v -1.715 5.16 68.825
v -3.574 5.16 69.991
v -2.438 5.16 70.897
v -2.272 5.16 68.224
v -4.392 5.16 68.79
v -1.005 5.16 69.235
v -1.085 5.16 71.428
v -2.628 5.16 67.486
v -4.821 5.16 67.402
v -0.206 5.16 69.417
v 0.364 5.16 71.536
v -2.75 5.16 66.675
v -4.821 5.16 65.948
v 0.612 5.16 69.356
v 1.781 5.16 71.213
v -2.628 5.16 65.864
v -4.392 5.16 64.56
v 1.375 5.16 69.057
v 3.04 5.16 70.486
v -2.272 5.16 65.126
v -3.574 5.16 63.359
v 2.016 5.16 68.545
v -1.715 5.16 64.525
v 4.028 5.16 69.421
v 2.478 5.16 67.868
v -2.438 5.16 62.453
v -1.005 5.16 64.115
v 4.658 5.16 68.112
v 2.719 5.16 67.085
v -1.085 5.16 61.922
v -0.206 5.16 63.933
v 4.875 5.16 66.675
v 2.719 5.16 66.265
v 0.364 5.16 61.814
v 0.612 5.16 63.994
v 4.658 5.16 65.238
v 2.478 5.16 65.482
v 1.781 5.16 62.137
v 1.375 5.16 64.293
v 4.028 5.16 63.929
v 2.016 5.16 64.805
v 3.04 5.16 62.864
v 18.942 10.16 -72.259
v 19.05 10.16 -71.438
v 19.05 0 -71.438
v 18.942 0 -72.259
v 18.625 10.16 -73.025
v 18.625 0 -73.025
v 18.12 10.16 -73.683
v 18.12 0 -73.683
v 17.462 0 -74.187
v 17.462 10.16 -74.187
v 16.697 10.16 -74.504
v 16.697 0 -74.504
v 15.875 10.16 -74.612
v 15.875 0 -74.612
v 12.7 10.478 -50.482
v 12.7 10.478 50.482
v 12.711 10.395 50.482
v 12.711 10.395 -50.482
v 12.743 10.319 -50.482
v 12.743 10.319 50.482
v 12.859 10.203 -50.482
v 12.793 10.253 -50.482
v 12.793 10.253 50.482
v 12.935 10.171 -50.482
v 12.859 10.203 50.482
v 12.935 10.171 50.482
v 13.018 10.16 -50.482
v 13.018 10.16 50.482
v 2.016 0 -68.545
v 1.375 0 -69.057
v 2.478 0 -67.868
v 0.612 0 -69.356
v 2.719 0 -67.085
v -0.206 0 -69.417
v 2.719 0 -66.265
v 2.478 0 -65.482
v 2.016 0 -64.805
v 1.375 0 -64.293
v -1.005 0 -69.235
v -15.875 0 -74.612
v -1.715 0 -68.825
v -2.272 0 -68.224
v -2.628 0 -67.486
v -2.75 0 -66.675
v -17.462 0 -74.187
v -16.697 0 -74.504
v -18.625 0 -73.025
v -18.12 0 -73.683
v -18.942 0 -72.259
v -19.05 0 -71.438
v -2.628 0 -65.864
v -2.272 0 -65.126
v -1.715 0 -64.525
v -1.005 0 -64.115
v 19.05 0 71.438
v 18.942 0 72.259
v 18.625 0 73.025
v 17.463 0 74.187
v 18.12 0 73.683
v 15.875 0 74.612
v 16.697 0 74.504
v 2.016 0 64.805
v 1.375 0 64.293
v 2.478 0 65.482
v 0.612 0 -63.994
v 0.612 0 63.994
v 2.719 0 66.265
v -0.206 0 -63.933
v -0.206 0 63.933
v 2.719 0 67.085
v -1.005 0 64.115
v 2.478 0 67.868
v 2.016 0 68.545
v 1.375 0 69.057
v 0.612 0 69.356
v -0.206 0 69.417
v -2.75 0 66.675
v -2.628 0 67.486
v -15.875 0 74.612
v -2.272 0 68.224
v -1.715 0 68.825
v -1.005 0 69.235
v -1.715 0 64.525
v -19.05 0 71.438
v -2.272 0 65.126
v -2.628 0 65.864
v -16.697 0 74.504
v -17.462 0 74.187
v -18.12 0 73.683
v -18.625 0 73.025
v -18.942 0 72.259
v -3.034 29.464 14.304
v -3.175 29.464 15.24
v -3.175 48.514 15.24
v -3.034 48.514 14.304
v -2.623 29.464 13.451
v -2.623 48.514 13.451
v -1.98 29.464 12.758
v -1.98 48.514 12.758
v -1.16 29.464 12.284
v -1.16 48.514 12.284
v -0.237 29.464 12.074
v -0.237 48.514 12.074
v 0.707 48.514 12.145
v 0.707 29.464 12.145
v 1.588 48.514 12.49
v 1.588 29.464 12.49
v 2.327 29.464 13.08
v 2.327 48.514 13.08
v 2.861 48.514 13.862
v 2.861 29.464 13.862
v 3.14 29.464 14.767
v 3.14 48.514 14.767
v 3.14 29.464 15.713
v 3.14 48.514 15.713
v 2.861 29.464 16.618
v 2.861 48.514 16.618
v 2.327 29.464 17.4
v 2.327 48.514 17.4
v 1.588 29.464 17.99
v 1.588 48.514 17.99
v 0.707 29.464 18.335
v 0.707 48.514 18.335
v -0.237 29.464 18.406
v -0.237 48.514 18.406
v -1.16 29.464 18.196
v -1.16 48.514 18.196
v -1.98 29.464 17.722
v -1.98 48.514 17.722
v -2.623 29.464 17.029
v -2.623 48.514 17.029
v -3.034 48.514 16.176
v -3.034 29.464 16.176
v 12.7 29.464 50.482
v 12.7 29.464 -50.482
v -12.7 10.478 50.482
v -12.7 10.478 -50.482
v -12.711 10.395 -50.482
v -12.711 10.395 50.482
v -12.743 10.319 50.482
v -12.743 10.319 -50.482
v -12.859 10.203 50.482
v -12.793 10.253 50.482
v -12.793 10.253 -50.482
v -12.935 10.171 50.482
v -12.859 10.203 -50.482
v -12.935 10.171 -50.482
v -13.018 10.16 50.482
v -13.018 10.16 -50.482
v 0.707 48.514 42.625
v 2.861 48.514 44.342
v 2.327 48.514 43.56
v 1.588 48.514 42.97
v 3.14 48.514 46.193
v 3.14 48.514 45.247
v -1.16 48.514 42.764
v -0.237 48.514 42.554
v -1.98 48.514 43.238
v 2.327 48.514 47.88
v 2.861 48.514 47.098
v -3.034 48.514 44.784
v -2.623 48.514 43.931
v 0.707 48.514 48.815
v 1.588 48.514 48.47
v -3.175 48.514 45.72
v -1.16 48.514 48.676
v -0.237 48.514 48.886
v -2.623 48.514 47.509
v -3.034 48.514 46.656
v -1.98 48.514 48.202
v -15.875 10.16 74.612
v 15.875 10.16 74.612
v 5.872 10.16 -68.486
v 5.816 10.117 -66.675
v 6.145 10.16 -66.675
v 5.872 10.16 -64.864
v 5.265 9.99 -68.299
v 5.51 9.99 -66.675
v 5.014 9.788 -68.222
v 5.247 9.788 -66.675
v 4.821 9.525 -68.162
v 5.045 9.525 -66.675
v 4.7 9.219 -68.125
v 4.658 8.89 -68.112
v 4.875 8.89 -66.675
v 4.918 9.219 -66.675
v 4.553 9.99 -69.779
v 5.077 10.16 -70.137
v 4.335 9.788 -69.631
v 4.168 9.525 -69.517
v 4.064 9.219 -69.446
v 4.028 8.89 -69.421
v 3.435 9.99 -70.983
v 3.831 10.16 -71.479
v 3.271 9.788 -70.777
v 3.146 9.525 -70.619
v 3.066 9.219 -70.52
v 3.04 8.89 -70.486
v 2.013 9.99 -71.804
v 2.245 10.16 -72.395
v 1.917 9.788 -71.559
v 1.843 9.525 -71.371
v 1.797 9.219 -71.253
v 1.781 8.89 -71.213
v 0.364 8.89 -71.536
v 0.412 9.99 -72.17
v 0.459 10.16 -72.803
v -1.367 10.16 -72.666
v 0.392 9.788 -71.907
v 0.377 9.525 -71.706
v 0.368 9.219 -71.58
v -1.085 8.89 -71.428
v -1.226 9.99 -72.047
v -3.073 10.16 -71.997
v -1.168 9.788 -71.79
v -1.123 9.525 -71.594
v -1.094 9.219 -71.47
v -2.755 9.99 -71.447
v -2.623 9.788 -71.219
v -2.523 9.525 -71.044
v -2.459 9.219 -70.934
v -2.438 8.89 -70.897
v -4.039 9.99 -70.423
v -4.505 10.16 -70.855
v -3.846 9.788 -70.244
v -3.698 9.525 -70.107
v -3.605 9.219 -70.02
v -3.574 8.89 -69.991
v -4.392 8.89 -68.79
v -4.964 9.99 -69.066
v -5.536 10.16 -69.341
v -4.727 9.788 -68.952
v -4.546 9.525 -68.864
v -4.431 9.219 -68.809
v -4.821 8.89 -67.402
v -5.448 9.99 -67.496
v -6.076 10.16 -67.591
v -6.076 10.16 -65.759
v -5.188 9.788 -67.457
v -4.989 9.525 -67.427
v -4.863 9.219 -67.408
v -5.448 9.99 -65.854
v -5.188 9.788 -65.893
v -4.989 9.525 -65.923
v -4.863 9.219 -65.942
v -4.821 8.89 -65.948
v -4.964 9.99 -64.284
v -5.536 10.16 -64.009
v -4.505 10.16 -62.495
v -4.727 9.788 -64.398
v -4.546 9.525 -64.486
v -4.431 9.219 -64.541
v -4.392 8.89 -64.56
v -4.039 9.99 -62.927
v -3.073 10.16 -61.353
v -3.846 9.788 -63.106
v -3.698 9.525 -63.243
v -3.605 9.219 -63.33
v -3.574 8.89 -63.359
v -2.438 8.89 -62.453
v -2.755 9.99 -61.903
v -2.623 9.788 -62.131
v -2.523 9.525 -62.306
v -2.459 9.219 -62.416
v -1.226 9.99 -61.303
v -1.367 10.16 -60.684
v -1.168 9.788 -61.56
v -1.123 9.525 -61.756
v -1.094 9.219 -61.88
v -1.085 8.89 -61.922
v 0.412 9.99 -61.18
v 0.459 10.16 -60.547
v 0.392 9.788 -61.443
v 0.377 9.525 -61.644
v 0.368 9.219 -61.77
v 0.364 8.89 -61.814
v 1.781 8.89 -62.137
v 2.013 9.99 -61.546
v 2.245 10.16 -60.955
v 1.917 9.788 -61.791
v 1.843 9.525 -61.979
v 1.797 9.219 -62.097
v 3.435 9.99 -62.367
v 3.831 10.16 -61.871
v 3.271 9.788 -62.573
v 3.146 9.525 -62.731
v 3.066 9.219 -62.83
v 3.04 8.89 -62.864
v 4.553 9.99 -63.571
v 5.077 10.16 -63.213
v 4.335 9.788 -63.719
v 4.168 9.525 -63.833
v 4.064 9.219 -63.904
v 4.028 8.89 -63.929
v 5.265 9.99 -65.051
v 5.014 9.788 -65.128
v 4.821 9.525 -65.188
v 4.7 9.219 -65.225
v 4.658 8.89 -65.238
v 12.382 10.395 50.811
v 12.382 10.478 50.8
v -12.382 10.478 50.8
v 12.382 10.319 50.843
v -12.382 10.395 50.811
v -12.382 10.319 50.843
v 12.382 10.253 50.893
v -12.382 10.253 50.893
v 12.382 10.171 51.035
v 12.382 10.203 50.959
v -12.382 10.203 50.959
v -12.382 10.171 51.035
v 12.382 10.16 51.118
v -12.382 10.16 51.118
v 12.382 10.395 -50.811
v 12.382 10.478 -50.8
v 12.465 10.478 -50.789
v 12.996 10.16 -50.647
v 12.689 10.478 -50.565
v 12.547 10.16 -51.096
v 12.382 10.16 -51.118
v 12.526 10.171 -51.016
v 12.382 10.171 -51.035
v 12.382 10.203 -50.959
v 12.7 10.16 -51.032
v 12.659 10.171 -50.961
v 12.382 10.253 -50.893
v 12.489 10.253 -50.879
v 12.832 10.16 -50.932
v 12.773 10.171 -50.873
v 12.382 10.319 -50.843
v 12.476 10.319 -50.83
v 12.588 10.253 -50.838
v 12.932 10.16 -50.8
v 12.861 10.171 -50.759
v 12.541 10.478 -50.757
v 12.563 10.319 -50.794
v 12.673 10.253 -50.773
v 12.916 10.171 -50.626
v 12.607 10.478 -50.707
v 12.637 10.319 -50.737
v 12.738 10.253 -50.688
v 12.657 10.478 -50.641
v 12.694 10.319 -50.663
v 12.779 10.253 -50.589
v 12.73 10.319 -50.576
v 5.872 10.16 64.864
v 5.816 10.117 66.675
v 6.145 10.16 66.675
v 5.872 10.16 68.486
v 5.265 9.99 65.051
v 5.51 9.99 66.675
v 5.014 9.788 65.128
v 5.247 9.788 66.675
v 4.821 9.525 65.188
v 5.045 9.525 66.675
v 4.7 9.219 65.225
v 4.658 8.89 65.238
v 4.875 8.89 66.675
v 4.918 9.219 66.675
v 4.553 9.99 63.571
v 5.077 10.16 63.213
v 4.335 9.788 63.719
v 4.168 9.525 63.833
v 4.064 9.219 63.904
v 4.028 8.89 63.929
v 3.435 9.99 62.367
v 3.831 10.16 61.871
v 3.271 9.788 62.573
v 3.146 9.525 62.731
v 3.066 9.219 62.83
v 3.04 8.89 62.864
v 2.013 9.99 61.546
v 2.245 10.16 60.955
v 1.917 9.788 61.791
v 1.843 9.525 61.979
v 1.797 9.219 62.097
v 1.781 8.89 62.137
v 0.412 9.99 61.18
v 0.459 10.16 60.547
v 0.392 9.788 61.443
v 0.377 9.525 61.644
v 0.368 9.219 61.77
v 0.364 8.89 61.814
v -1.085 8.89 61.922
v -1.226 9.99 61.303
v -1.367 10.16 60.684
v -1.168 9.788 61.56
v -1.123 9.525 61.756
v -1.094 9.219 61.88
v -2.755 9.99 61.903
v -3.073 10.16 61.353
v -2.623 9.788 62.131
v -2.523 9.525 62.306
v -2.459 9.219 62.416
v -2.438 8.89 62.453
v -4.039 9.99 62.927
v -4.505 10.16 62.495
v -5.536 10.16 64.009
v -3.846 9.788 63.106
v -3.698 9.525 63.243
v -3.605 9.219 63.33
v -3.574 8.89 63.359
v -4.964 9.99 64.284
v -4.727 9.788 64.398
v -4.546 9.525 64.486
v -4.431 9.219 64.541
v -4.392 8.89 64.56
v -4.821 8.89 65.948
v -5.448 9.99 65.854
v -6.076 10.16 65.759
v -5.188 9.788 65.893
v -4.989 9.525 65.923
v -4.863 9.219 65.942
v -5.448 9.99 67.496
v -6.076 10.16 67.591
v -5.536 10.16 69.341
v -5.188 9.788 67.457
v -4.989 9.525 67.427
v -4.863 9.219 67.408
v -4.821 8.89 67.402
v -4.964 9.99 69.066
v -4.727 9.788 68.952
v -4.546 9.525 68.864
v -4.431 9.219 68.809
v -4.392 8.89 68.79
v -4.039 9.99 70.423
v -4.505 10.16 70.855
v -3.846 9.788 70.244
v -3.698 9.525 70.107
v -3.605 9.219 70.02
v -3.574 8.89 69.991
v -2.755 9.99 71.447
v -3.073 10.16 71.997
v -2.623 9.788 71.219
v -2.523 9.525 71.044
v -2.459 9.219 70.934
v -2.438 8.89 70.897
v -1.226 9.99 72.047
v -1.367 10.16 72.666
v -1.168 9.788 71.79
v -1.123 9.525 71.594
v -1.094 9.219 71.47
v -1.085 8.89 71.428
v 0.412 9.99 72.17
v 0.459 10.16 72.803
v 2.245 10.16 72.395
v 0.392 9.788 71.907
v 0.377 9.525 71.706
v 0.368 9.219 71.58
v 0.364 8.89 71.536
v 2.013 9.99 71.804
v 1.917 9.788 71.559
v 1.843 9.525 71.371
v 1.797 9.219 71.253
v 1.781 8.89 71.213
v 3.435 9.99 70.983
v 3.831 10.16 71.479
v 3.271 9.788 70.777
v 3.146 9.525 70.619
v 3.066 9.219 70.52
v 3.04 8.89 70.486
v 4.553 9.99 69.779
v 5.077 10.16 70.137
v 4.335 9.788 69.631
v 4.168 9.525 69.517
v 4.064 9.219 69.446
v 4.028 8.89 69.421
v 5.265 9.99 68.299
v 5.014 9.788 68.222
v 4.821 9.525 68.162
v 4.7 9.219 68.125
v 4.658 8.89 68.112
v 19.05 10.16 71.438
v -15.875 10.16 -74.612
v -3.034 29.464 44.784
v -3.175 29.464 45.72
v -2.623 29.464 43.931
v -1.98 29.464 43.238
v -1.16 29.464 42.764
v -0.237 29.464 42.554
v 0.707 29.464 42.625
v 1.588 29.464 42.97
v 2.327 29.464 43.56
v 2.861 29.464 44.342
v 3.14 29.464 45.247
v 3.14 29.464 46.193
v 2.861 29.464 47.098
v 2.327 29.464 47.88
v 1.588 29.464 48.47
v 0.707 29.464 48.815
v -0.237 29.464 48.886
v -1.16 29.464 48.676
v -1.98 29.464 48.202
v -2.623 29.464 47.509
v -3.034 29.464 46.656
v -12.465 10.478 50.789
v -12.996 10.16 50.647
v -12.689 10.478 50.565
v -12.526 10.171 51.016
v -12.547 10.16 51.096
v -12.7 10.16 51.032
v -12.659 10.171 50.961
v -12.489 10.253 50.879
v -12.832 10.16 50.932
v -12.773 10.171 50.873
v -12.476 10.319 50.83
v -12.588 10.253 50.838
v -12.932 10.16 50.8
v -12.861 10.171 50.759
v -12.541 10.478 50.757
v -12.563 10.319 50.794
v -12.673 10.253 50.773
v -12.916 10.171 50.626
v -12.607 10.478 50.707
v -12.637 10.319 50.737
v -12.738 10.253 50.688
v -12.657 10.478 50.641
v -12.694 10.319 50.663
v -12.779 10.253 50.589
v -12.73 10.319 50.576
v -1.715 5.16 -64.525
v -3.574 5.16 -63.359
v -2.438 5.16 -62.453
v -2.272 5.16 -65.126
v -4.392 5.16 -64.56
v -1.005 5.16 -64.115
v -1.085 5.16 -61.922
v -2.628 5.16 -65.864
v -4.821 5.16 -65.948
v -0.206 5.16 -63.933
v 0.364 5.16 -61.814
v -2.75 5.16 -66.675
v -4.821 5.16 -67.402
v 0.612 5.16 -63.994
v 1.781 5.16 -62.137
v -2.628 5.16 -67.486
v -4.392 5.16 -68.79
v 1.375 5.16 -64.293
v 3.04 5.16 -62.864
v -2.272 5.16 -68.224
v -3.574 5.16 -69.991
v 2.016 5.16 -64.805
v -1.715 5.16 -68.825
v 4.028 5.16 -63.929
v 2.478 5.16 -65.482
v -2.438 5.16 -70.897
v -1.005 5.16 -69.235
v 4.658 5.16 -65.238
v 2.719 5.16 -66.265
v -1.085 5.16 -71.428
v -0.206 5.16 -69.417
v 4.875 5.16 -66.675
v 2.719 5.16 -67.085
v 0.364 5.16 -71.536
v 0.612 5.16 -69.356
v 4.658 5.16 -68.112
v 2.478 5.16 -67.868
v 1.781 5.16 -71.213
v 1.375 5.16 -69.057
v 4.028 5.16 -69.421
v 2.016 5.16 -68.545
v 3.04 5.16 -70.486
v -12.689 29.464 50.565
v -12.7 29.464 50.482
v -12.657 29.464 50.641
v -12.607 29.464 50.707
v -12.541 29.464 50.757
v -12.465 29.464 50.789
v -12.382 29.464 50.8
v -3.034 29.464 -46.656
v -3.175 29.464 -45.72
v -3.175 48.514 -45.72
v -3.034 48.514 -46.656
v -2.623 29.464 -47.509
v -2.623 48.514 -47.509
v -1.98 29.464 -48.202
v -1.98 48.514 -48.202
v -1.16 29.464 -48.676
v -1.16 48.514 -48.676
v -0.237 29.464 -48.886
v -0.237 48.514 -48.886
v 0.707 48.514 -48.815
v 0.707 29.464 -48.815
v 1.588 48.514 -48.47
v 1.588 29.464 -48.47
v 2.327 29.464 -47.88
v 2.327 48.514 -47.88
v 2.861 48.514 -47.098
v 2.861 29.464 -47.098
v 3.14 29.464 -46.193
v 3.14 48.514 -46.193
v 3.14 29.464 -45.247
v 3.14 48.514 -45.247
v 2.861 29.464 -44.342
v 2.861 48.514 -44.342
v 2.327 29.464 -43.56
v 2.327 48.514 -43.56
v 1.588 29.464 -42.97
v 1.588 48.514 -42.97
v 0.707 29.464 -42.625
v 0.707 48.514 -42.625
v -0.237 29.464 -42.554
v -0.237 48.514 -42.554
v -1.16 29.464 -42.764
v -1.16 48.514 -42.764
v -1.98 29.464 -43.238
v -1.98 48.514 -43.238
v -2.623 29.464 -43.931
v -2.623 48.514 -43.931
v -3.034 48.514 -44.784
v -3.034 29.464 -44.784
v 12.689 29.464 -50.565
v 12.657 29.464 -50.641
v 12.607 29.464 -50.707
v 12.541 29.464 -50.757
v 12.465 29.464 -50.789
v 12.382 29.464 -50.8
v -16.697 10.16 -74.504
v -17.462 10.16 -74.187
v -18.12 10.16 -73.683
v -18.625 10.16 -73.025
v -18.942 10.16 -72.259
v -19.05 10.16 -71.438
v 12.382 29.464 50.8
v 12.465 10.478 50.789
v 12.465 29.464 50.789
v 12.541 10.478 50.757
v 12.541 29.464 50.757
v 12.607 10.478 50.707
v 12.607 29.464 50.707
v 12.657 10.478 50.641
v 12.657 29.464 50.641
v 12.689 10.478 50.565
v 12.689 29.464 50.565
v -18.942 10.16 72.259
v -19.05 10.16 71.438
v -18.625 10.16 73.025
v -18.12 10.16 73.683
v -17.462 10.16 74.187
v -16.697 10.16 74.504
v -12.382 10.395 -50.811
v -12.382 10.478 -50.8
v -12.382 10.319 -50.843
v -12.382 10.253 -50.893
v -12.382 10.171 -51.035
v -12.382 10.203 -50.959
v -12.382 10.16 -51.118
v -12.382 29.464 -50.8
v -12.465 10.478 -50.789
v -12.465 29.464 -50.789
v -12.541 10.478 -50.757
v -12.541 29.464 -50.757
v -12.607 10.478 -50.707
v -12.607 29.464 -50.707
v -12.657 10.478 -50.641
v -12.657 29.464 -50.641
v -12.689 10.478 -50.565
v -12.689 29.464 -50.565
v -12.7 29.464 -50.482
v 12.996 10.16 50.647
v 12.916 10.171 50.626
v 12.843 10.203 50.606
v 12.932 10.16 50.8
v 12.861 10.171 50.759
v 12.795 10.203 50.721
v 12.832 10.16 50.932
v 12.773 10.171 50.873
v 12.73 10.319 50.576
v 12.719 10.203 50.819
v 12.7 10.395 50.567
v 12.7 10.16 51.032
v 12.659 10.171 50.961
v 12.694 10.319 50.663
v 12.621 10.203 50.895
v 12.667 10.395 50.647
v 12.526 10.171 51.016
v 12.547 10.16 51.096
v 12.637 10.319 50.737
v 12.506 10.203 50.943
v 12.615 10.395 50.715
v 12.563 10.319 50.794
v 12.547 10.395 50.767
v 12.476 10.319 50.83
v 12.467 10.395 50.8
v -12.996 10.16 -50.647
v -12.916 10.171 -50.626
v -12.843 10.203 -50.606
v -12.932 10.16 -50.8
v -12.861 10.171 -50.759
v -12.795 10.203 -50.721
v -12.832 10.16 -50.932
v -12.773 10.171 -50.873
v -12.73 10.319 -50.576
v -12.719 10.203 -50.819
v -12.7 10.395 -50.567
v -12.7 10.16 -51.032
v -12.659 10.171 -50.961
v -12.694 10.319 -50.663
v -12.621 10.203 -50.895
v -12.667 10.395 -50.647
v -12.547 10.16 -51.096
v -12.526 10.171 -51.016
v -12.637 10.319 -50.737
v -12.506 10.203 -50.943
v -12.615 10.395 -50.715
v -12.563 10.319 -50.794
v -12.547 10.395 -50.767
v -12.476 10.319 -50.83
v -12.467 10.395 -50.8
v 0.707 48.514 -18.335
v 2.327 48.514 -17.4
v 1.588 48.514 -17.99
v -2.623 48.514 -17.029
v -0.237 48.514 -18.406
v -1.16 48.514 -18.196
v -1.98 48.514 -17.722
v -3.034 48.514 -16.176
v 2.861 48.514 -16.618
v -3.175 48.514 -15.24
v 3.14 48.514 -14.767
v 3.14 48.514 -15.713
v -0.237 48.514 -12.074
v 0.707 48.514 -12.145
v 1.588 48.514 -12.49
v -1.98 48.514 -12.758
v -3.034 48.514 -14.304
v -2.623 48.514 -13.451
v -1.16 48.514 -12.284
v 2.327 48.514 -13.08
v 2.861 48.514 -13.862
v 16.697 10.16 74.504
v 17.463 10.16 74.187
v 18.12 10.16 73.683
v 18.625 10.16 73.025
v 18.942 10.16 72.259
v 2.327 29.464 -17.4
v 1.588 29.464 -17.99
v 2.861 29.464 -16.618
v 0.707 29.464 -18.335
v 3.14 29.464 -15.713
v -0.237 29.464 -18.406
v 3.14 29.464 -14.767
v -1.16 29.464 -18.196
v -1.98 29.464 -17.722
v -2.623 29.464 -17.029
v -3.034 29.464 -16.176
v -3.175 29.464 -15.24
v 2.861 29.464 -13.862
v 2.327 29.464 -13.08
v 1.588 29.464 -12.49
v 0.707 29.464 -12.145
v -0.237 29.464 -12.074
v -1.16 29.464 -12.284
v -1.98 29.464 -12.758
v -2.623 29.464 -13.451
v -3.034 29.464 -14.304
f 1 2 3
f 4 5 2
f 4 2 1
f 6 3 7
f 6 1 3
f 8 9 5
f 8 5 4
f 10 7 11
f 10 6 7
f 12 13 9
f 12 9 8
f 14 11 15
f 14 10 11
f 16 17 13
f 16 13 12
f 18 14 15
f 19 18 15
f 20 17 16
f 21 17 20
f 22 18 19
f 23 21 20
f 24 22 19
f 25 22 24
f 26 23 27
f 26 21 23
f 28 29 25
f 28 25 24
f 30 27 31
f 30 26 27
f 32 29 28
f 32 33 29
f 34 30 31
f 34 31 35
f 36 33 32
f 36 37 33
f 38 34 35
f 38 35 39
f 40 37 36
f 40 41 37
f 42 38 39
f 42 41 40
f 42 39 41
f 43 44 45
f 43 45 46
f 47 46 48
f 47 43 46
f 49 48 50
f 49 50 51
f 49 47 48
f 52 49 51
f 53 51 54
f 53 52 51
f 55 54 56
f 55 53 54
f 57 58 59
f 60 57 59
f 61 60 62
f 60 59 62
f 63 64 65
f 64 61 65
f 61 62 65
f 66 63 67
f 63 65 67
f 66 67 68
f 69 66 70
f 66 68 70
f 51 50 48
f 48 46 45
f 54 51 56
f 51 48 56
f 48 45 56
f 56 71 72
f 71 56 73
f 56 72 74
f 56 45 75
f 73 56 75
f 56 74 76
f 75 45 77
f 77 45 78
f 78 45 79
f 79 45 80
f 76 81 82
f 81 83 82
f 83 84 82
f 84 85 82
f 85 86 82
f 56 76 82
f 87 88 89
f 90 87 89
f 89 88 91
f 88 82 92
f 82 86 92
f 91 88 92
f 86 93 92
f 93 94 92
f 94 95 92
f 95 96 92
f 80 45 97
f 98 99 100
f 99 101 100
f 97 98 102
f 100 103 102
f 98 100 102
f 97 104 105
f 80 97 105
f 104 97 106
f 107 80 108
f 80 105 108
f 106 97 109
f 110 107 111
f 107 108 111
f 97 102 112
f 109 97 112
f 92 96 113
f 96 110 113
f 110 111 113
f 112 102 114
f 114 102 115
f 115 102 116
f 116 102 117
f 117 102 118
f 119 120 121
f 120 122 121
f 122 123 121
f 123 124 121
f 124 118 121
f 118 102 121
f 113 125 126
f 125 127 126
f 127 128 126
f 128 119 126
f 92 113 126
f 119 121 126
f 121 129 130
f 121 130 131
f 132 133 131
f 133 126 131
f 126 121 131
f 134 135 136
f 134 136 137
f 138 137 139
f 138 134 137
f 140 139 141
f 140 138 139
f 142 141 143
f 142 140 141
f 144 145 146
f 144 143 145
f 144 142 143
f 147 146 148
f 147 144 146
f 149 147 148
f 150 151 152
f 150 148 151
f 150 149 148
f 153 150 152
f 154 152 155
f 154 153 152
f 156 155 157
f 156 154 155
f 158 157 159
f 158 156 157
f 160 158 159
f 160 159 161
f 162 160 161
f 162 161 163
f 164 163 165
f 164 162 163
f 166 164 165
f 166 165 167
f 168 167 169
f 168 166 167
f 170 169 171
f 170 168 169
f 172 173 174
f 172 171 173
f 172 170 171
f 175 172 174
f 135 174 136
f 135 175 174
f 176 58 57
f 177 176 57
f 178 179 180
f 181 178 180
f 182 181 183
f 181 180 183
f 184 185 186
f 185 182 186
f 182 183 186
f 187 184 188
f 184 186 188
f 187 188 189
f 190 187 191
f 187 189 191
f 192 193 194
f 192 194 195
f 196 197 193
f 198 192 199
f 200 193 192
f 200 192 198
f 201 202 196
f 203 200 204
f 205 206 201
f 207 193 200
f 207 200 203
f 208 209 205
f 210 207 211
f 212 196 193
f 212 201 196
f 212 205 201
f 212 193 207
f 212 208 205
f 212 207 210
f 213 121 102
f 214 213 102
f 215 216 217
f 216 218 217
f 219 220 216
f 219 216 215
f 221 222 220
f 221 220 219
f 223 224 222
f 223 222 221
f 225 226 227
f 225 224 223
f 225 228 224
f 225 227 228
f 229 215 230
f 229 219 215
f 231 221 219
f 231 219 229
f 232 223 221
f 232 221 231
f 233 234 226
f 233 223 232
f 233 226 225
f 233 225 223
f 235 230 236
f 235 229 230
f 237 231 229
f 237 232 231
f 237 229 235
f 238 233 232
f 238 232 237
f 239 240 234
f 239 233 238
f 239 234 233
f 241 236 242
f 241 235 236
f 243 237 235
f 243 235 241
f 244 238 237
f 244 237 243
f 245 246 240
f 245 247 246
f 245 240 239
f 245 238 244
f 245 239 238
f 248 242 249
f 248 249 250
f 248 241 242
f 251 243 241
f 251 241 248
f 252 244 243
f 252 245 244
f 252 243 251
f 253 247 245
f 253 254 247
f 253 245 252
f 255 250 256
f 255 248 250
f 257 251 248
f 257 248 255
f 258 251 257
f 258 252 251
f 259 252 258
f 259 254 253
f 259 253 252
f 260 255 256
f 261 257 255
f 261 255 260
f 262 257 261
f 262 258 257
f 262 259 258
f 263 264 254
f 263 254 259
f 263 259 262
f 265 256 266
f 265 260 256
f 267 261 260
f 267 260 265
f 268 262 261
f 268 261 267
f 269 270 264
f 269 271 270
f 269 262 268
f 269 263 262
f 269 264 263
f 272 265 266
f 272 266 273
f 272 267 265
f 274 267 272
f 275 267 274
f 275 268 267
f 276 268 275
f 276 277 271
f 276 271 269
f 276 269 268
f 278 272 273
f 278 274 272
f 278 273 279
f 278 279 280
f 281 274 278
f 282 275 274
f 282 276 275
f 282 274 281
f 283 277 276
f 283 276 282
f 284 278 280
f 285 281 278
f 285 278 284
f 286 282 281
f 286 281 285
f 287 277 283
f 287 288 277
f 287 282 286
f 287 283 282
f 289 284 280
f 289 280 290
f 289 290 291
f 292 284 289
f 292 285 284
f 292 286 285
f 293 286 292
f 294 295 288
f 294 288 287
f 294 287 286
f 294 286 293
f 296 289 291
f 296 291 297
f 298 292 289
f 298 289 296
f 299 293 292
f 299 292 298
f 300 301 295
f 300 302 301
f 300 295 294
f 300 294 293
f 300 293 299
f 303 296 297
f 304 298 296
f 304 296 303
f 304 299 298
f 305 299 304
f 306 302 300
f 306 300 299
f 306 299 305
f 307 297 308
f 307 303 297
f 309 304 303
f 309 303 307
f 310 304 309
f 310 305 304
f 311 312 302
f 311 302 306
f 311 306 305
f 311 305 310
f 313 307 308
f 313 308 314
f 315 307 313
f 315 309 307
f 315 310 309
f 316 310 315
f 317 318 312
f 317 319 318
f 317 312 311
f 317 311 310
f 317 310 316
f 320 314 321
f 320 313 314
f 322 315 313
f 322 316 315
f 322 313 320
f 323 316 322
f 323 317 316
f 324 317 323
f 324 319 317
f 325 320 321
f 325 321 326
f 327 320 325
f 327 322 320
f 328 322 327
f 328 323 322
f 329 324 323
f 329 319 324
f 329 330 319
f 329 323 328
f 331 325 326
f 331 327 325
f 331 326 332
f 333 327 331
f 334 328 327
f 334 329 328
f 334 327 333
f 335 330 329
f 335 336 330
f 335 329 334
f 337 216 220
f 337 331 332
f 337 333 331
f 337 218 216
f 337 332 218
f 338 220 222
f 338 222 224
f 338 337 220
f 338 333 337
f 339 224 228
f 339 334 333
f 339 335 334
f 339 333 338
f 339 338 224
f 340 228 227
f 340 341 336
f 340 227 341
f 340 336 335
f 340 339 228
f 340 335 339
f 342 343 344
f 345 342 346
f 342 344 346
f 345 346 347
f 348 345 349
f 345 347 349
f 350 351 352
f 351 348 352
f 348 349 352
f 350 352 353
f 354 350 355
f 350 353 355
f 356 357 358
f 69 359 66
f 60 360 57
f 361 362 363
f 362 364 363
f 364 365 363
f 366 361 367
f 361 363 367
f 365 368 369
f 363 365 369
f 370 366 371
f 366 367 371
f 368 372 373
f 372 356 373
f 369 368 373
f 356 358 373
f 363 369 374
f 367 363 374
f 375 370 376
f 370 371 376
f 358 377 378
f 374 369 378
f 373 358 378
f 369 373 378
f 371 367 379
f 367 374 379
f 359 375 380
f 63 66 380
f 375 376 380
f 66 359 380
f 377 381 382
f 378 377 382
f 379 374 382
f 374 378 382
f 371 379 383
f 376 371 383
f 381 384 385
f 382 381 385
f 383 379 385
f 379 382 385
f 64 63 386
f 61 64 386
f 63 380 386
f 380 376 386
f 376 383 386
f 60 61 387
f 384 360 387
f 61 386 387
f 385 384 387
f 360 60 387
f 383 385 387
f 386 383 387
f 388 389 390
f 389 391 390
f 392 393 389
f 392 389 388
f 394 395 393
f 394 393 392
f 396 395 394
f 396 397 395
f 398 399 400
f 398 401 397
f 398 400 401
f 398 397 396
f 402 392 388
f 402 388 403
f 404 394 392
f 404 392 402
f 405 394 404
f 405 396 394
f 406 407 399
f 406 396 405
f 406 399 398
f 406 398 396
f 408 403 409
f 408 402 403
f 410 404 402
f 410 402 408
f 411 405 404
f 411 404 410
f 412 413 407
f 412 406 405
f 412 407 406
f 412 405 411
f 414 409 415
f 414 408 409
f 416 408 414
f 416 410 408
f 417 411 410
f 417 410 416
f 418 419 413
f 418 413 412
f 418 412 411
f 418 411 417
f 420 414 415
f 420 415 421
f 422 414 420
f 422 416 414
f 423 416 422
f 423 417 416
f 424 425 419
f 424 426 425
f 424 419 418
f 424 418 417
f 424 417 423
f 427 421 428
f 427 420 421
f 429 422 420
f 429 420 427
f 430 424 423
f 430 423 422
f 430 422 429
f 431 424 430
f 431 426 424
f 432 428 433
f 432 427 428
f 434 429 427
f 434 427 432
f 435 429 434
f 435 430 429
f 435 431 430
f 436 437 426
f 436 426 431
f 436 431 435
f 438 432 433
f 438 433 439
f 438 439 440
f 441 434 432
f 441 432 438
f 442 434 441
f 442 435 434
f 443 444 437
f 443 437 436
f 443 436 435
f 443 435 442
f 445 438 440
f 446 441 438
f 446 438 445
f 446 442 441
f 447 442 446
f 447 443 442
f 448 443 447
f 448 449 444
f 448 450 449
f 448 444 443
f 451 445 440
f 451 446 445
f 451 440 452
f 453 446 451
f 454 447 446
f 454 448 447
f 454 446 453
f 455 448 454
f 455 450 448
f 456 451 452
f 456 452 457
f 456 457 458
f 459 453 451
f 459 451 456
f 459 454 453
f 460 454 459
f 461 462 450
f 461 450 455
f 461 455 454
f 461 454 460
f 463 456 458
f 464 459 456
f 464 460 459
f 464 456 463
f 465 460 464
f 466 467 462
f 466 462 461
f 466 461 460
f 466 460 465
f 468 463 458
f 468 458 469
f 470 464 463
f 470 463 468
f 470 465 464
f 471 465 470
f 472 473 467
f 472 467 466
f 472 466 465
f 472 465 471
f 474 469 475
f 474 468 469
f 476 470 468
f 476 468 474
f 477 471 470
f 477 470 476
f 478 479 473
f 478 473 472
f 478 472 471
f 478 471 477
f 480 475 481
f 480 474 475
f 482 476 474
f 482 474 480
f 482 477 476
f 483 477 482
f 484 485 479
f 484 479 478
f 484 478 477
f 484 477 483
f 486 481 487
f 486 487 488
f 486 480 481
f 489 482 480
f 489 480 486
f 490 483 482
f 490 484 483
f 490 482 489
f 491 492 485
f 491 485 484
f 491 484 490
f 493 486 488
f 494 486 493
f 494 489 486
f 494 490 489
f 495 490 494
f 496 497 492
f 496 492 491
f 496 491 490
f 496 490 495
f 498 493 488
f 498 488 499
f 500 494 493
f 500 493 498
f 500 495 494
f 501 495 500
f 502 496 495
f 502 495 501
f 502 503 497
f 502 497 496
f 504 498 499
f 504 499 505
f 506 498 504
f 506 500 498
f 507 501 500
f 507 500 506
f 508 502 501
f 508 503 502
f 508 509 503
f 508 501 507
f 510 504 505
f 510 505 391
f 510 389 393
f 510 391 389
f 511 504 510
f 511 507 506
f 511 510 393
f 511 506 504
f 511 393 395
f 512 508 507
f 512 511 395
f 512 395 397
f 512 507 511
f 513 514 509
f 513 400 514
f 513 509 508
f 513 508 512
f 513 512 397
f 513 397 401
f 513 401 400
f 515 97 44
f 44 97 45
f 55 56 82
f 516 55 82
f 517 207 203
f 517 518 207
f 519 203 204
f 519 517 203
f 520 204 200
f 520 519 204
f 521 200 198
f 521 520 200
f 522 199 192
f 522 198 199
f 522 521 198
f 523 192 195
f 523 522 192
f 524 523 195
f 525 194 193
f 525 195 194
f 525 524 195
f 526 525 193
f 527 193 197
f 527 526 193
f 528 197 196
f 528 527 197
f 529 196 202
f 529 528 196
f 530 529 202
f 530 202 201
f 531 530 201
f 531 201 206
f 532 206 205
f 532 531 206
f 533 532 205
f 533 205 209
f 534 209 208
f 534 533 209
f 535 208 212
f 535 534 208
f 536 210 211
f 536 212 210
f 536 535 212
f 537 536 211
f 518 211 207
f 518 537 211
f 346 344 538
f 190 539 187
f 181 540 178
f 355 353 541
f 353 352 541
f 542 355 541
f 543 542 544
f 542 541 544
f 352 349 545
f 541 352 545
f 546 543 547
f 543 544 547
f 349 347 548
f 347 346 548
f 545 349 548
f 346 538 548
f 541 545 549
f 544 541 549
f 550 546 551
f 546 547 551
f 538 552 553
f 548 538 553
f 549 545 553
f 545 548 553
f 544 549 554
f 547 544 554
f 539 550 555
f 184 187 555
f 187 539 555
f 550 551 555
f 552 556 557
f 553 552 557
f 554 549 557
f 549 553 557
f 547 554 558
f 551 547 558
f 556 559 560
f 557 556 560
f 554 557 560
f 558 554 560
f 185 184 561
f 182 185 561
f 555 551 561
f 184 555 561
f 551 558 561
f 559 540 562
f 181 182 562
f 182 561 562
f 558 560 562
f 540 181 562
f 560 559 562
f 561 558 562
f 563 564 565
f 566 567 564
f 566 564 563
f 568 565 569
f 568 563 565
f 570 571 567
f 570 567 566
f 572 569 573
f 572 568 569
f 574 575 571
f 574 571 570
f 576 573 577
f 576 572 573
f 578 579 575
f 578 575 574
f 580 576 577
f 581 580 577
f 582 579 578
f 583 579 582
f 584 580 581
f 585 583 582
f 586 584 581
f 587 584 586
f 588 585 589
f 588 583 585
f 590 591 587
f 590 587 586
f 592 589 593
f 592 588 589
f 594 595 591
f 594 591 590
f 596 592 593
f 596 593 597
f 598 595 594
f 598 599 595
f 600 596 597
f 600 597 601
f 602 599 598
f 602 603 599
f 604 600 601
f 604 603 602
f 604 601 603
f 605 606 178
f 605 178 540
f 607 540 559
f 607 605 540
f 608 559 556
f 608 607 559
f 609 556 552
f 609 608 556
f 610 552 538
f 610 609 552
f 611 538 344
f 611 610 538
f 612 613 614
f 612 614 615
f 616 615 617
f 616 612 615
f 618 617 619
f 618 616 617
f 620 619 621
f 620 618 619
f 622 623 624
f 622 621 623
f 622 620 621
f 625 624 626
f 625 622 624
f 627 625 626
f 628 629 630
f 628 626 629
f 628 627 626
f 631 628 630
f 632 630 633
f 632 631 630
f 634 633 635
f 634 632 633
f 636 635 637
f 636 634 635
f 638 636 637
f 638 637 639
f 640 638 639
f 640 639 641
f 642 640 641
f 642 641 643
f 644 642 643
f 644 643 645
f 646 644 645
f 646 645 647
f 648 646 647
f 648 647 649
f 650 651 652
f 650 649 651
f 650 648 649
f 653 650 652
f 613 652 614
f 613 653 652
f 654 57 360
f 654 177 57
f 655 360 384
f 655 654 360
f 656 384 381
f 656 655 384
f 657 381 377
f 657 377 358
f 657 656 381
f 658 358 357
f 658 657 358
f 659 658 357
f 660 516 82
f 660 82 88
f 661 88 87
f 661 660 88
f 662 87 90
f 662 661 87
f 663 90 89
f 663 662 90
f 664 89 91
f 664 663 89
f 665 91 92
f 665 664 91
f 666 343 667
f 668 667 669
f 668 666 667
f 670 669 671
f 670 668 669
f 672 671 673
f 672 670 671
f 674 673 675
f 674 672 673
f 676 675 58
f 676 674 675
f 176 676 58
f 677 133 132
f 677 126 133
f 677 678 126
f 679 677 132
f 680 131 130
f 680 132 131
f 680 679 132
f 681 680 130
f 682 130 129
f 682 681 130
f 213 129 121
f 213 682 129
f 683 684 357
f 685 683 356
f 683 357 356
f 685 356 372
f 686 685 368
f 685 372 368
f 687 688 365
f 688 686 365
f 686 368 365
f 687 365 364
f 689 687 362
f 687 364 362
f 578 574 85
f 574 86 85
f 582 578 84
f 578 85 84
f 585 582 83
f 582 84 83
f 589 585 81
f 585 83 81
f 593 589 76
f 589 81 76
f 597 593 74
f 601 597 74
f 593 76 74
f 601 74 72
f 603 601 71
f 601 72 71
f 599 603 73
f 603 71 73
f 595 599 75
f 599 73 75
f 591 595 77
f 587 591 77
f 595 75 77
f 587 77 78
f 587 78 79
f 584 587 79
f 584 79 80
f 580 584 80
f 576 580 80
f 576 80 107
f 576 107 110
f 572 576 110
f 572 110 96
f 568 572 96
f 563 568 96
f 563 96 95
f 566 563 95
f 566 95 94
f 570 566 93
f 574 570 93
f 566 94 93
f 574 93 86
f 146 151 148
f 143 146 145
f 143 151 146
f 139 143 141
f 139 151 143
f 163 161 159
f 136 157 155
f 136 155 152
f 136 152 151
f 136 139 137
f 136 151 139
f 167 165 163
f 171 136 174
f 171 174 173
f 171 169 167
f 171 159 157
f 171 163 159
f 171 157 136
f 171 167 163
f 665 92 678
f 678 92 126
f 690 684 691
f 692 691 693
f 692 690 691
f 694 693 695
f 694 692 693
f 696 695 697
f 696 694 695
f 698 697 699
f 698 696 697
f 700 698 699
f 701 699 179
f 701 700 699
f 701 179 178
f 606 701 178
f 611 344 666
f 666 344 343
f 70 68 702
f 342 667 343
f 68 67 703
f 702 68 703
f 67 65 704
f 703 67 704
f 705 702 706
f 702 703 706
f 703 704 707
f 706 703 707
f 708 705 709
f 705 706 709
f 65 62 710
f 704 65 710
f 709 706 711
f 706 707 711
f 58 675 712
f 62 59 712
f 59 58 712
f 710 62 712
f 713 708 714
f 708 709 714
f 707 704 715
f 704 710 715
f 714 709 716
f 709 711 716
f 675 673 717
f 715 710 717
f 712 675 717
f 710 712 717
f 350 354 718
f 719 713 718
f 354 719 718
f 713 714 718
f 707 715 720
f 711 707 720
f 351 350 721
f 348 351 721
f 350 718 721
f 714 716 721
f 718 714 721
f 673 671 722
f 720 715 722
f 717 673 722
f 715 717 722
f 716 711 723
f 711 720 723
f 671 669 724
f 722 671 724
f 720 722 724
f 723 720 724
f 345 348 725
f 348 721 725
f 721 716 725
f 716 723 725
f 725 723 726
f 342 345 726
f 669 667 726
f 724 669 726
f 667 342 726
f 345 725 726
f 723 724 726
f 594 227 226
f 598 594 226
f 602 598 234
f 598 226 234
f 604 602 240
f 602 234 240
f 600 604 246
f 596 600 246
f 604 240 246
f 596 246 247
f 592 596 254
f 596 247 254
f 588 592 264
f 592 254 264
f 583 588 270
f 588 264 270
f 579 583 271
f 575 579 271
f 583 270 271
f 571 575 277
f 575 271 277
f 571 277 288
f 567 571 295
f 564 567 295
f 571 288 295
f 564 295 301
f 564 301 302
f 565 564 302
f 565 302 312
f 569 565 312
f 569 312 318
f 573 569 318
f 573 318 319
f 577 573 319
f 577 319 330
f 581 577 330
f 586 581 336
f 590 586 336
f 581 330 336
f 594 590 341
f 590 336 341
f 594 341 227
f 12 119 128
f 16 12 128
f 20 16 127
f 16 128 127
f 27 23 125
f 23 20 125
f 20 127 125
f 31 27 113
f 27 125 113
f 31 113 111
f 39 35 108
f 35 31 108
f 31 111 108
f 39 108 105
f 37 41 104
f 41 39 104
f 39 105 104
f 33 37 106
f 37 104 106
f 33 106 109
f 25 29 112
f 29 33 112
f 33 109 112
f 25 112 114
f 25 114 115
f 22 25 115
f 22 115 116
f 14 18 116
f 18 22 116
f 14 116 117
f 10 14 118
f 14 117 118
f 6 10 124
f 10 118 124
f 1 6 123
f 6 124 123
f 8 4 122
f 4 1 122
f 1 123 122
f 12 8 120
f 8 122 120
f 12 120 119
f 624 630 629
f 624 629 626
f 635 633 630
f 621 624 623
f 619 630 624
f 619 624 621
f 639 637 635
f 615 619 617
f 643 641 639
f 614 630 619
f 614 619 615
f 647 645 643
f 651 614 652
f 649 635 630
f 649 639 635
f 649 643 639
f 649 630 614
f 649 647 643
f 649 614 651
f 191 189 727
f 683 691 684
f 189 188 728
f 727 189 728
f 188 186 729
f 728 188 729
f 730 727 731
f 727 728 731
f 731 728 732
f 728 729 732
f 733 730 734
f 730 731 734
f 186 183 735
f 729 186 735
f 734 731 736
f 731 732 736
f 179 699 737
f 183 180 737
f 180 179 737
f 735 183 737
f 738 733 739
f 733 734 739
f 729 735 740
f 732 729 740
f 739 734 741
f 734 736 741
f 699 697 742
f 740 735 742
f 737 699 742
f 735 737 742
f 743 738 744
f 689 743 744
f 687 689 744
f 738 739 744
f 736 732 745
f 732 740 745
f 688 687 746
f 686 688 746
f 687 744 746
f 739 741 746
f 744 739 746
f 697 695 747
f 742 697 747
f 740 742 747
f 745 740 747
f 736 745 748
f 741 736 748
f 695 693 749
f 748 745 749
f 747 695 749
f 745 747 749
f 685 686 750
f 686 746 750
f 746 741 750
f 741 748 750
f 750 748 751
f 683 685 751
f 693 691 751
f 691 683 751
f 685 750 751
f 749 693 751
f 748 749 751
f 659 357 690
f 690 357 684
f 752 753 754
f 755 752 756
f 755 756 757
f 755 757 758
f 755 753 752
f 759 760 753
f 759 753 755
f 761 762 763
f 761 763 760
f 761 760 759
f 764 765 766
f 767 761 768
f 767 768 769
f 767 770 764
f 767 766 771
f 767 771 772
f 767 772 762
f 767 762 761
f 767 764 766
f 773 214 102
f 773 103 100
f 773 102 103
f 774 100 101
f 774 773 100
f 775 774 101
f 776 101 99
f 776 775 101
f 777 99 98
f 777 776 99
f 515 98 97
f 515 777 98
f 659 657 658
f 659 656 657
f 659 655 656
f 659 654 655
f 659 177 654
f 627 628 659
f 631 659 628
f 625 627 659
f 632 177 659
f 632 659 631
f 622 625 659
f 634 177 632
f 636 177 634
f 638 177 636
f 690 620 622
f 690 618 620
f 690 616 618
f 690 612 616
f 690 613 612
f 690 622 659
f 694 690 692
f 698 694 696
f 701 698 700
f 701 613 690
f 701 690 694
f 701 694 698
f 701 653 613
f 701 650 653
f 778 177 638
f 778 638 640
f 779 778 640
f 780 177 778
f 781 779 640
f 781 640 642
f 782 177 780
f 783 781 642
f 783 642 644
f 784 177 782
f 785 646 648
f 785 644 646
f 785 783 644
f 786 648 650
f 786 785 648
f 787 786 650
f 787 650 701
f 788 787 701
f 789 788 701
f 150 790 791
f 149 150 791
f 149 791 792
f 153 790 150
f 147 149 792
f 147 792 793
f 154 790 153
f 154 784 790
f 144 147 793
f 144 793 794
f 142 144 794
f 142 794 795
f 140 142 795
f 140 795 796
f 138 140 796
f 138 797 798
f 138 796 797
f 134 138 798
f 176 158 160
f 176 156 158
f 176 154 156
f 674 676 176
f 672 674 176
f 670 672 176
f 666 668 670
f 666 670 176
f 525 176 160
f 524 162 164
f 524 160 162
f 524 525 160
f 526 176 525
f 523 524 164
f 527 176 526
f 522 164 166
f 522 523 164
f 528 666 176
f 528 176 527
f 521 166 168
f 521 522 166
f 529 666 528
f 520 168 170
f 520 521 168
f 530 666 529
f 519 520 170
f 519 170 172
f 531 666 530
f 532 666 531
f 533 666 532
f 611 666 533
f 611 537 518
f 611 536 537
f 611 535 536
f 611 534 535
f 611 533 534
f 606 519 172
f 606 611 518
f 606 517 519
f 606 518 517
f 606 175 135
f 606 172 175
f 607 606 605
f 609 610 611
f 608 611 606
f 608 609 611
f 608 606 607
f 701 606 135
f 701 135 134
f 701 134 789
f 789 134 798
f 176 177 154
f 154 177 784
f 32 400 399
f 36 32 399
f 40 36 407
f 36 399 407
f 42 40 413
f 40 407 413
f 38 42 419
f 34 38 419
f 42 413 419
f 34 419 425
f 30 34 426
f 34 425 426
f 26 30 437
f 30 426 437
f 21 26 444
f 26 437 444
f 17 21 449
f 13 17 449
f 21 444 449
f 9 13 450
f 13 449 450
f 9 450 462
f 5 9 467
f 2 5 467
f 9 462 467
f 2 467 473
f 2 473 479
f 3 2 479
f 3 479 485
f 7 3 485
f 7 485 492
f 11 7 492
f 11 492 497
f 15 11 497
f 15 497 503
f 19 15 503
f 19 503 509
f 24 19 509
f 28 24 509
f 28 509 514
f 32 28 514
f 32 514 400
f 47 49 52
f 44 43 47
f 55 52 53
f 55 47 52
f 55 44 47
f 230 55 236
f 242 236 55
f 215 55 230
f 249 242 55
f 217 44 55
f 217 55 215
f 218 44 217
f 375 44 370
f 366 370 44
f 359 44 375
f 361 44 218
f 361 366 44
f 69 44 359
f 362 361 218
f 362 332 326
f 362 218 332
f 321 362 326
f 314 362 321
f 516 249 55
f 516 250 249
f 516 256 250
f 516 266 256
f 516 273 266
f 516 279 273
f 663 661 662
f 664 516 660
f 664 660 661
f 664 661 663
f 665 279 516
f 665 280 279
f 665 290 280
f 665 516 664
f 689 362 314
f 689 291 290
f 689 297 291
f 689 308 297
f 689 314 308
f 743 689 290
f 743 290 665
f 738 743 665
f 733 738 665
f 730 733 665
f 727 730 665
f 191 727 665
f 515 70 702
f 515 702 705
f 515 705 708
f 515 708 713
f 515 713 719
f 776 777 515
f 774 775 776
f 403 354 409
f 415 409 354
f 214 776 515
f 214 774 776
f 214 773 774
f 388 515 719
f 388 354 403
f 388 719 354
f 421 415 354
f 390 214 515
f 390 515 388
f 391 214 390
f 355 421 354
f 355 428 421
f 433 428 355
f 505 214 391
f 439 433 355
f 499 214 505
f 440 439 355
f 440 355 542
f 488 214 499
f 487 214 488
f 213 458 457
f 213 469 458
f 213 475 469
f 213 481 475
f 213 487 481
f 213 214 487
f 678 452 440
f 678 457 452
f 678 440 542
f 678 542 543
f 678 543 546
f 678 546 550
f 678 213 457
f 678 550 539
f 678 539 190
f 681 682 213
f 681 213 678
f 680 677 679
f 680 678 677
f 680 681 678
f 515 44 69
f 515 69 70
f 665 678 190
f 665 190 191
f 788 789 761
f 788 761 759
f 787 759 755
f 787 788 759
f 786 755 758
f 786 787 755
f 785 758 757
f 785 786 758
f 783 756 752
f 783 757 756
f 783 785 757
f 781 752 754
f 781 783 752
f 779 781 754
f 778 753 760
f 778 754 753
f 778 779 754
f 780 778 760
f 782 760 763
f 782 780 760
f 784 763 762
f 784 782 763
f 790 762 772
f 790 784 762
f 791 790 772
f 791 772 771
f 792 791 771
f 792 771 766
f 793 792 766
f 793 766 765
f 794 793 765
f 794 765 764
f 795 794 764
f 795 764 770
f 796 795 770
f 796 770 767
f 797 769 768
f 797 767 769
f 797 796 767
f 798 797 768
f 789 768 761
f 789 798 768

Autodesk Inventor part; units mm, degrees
ref_plane "YZ Plane" through (0, 0, 0) normal (1, 0, 0) x (0, 1, 0)
ref_plane "XZ Plane" through (0, 0, 0) normal (0, 1, 0) x (-1, 0, 0)
ref_plane "XY Plane" through (0, 0, 0) normal (0, 0, 1) x (1, 0, 0)
sketch "Sketch1" plane through (0, 0, 0) normal (0, 1, 0) x (-1, 0, 0)
  line L0 (-19.05, -74.6125) -> (19.05, -74.6125)
  line L1 (19.05, -74.6125) -> (19.05, 74.6125)
  line L2 (19.05, 74.6125) -> (-19.05, 74.6125)
  line L3 (-19.05, 74.6125) -> (-19.05, -74.6125)
  line L4 (-19.05, -74.6125) -> (19.05, 74.6125) construction
  line L5 (19.05, -74.6125) -> (-19.05, 74.6125) construction
  circle A0 centre (0, 66.675) radius 2.75
  circle A1 centre (0, -66.675) radius 2.75
  line L6 (-12.7, -50.8) -> (12.7, -50.8)
  line L7 (12.7, -50.8) -> (12.7, 50.8)
  line L8 (12.7, 50.8) -> (-12.7, 50.8)
  line L9 (-12.7, 50.8) -> (-12.7, -50.8)
  line L10 (-12.7, -50.8) -> (12.7, 50.8) construction
  line L11 (12.7, -50.8) -> (-12.7, 50.8) construction
  circle A2 centre (0, -15.24) radius 3.175
  circle A3 centre (0, -45.72) radius 3.175
  circle A4 centre (0, 15.24) radius 3.175
  circle A5 centre (0, 45.72) radius 3.175
  point P0 (0, 0)
  point P1 (0, 50.8)
  dimension "d0" = 38.1
  dimension "d1" = 149.225
  dimension "d2" = 133.35
  dimension "d3" = 5.5
  dimension "d4" = 5.5
  dimension "d7" = 25.4
  dimension "d8" = 101.6
  dimension "d9" = 6.35
  dimension "d10" = 6.35
  dimension "d11" = 6.35
  dimension "d12" = 6.35
  dimension "d13" = 30.48
  dimension "d14" = 30.48
  dimension "d16" = 5.08
  dimension "d17" = 5.08
  dimension "d19" = 30.48
  dimension "d20" = 66.675
extrude "Extrusion1" add sketch "Sketch1" along normal blind 10.16 contours L3 L2 L1 L0 | L9 L8 L7 L6 | A2 | A3 | A4 | A5
extrude "Extrusion2" add sketch "Sketch1" along normal blind 29.464 contours L9 L8 L7 L6
extrude "Extrusion3" add sketch "Sketch1" along normal blind 48.514 contours A2 | A3 | A4 | A5
sketch "Sketch2" plane through (0, 10.16, 0) normal (0, 1, 0) x (1, 0, 0)
  circle A0 centre (0, -66.675) radius 4.875
  circle A1 centre (0, -66.675) radius 2.75 projected
  circle A2 centre (0, 66.675) radius 4.875
  circle A3 centre (0, 66.675) radius 2.75 projected
  point P0 (0, 0)
  dimension "d25" = 9.75
  dimension "d26" = 9.75
extrude "Extrusion4" cut sketch "Sketch2" against normal blind 5 contours A0 | A2 | A3
fillet "Fillet1" radius 0.3175 8 edges at (12.7, 19.812, 50.8) (-12.7, 19.812, 50.8) (12.7, 19.812, -50.8) (-12.7, 19.812, -50.8) (12.7, 10.16, 0) (0, 10.16, 50.8) (-12.7, 10.16, 0) (0, 10.16, -50.8)
fillet "Fillet2" radius 3.175 4 edges at (19.05, 5.08, 74.6125) (-19.05, 5.08, 74.6125) (19.05, 5.08, -74.6125) (-19.05, 5.08, -74.6125)
fillet "Fillet3" radius 1.27 2 edges at (-4.875, 10.16, 66.675) (-4.875, 10.16, -66.675)
equation "\"d4\" = d3"
equation "\"d10\" = d9"
equation "\"d11\" = d9"
equation "\"d12\" = d9"
equation "\"d20\" = 0.5 * d2"
properties part number "BlueSea_BusBar"
